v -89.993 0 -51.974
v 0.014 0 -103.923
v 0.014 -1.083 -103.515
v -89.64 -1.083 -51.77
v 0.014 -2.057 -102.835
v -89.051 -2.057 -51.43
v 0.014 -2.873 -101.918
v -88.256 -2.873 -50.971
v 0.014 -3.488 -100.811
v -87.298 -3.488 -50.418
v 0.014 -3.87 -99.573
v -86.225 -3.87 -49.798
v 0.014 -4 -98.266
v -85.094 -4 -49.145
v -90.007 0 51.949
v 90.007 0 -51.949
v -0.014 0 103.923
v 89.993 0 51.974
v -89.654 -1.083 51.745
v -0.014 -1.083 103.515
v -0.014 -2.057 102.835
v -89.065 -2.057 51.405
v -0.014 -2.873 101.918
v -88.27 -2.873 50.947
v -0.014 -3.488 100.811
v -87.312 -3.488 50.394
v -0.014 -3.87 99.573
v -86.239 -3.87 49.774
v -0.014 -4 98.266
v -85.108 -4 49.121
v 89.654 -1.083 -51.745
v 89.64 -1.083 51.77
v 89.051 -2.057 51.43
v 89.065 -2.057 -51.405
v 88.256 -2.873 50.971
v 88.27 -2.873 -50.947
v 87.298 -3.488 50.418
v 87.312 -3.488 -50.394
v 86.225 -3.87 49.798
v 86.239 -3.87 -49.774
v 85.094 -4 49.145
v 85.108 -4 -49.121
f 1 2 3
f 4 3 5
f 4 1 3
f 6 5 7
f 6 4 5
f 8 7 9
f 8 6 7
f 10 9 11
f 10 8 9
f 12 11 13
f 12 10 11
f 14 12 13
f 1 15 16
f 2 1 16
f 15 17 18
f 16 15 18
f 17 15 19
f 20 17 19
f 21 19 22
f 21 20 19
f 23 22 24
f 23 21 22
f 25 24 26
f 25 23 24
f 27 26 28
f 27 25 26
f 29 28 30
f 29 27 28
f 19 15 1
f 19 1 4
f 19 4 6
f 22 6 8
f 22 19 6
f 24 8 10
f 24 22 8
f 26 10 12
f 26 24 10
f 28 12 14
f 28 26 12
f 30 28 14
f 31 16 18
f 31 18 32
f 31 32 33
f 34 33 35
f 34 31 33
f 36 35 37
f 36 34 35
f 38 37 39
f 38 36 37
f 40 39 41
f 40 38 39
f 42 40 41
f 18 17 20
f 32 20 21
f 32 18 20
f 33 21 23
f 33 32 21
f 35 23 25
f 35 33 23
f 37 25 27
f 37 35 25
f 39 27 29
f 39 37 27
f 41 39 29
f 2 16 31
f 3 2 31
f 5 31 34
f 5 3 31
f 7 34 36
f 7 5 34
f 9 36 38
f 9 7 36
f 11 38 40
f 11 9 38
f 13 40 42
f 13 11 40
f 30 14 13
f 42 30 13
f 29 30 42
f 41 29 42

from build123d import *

# Parameters (mm, degrees)
F1_DEPTH     = 4
F2_T1_DEPTH  = 128.417945882
F2_T3_DEPTH  = 128.417945882
F2_T5_DEPTH  = 128.417945882
F2_T7_DEPTH  = 128.417945882
F2_T9_DEPTH  = 128.417945882
F2_T11_DEPTH = 128.417945882


# Not quite as in the source:
# - a fillet or chamfer that OpenCascade refuses, or shapes differently, is made with other operations: its cross-section is extruded or revolved along the edge and cut away or added


with BuildPart() as f1:
    # F0 (on Front) → F1 (new body)
    with BuildSketch(Plane.XZ):
        Polygon((89.9928545723, 51.9738985062), (-0.0142891539, 103.9230474718), (-90.0071437262, 51.9491489656), (-89.9928545723, -51.9738985062), (0.0142891539, -103.9230474718), (90.0071437262, -51.9491489656), align=None)
    extrude(amount=F1_DEPTH)

    # F2: fillet of radius 5 on 6 edges, made by hand

    # F2_s2 → F2_t1 (cut)
    with BuildSketch(Plane(origin=(-0.0088285699, 0, 64.208972334), x_dir=(0, 1, 0), z_dir=(0.0001374974, 0, -0.9999999905))):
        with BuildLine():
            ThreePointArc((0, -90), (-2.8729833462, -88.2632981746), (-4, -85.1010205144))
            Line((-4, -85.1010205144), (-4, -90))
            Line((-4, -90), (0, -90))
        make_face()
    extrude(amount=F2_T1_DEPTH, mode=Mode.SUBTRACT)

    # F2_s4 → F2_t3 (cut)
    with BuildSketch(Plane(origin=(55.6021869072, 0, 32.1121319328), x_dir=(0, 1, 0), z_dir=(-0.8659566469, 0, -0.5001190716))):
        with BuildLine():
            ThreePointArc((0, -90), (-2.8729833462, -88.2632981746), (-4, -85.1010205144))
            Line((-4, -85.1010205144), (-4, -90))
            Line((-4, -90), (0, -90))
        make_face()
    extrude(amount=F2_T3_DEPTH, mode=Mode.SUBTRACT)

    # F2_s6 → F2_t5 (cut)
    with BuildSketch(Plane(origin=(55.6110154771, 0, -32.0968404012), x_dir=(0, 1, 0), z_dir=(-0.8660941443, 0, 0.499880919))):
        with BuildLine():
            ThreePointArc((0, -90), (-2.8729833462, -88.2632981746), (-4, -85.1010205144))
            Line((-4, -85.1010205144), (-4, -90))
            Line((-4, -90), (0, -90))
        make_face()
    extrude(amount=F2_T5_DEPTH, mode=Mode.SUBTRACT)

    # F2_s8 → F2_t7 (cut)
    with BuildSketch(Plane(origin=(0.0088285699, 0, -64.208972334), x_dir=(0, 1, 0), z_dir=(-0.0001374974, 0, 0.9999999905))):
        with BuildLine():
            ThreePointArc((0, -90), (-2.8729833462, -88.2632981746), (-4, -85.1010205144))
            Line((-4, -85.1010205144), (-4, -90))
            Line((-4, -90), (0, -90))
        make_face()
    extrude(amount=F2_T7_DEPTH, mode=Mode.SUBTRACT)

    # F2_s10 → F2_t9 (cut)
    with BuildSketch(Plane(origin=(-55.6021869072, 0, -32.1121319328), x_dir=(0, 1, 0), z_dir=(0.8659566469, 0, 0.5001190716))):
        with BuildLine():
            ThreePointArc((0, -90), (-2.8729833462, -88.2632981746), (-4, -85.1010205144))
            Line((-4, -85.1010205144), (-4, -90))
            Line((-4, -90), (0, -90))
        make_face()
    extrude(amount=F2_T9_DEPTH, mode=Mode.SUBTRACT)

    # F2_s12 → F2_t11 (cut)
    with BuildSketch(Plane(origin=(-55.6110154771, 0, 32.0968404012), x_dir=(0, 1, 0), z_dir=(0.8660941443, 0, -0.499880919))):
        with BuildLine():
            ThreePointArc((0, -90), (-2.8729833462, -88.2632981746), (-4, -85.1010205144))
            Line((-4, -85.1010205144), (-4, -90))
            Line((-4, -90), (0, -90))
        make_face()
    extrude(amount=F2_T11_DEPTH, mode=Mode.SUBTRACT)


solid = f1.part
